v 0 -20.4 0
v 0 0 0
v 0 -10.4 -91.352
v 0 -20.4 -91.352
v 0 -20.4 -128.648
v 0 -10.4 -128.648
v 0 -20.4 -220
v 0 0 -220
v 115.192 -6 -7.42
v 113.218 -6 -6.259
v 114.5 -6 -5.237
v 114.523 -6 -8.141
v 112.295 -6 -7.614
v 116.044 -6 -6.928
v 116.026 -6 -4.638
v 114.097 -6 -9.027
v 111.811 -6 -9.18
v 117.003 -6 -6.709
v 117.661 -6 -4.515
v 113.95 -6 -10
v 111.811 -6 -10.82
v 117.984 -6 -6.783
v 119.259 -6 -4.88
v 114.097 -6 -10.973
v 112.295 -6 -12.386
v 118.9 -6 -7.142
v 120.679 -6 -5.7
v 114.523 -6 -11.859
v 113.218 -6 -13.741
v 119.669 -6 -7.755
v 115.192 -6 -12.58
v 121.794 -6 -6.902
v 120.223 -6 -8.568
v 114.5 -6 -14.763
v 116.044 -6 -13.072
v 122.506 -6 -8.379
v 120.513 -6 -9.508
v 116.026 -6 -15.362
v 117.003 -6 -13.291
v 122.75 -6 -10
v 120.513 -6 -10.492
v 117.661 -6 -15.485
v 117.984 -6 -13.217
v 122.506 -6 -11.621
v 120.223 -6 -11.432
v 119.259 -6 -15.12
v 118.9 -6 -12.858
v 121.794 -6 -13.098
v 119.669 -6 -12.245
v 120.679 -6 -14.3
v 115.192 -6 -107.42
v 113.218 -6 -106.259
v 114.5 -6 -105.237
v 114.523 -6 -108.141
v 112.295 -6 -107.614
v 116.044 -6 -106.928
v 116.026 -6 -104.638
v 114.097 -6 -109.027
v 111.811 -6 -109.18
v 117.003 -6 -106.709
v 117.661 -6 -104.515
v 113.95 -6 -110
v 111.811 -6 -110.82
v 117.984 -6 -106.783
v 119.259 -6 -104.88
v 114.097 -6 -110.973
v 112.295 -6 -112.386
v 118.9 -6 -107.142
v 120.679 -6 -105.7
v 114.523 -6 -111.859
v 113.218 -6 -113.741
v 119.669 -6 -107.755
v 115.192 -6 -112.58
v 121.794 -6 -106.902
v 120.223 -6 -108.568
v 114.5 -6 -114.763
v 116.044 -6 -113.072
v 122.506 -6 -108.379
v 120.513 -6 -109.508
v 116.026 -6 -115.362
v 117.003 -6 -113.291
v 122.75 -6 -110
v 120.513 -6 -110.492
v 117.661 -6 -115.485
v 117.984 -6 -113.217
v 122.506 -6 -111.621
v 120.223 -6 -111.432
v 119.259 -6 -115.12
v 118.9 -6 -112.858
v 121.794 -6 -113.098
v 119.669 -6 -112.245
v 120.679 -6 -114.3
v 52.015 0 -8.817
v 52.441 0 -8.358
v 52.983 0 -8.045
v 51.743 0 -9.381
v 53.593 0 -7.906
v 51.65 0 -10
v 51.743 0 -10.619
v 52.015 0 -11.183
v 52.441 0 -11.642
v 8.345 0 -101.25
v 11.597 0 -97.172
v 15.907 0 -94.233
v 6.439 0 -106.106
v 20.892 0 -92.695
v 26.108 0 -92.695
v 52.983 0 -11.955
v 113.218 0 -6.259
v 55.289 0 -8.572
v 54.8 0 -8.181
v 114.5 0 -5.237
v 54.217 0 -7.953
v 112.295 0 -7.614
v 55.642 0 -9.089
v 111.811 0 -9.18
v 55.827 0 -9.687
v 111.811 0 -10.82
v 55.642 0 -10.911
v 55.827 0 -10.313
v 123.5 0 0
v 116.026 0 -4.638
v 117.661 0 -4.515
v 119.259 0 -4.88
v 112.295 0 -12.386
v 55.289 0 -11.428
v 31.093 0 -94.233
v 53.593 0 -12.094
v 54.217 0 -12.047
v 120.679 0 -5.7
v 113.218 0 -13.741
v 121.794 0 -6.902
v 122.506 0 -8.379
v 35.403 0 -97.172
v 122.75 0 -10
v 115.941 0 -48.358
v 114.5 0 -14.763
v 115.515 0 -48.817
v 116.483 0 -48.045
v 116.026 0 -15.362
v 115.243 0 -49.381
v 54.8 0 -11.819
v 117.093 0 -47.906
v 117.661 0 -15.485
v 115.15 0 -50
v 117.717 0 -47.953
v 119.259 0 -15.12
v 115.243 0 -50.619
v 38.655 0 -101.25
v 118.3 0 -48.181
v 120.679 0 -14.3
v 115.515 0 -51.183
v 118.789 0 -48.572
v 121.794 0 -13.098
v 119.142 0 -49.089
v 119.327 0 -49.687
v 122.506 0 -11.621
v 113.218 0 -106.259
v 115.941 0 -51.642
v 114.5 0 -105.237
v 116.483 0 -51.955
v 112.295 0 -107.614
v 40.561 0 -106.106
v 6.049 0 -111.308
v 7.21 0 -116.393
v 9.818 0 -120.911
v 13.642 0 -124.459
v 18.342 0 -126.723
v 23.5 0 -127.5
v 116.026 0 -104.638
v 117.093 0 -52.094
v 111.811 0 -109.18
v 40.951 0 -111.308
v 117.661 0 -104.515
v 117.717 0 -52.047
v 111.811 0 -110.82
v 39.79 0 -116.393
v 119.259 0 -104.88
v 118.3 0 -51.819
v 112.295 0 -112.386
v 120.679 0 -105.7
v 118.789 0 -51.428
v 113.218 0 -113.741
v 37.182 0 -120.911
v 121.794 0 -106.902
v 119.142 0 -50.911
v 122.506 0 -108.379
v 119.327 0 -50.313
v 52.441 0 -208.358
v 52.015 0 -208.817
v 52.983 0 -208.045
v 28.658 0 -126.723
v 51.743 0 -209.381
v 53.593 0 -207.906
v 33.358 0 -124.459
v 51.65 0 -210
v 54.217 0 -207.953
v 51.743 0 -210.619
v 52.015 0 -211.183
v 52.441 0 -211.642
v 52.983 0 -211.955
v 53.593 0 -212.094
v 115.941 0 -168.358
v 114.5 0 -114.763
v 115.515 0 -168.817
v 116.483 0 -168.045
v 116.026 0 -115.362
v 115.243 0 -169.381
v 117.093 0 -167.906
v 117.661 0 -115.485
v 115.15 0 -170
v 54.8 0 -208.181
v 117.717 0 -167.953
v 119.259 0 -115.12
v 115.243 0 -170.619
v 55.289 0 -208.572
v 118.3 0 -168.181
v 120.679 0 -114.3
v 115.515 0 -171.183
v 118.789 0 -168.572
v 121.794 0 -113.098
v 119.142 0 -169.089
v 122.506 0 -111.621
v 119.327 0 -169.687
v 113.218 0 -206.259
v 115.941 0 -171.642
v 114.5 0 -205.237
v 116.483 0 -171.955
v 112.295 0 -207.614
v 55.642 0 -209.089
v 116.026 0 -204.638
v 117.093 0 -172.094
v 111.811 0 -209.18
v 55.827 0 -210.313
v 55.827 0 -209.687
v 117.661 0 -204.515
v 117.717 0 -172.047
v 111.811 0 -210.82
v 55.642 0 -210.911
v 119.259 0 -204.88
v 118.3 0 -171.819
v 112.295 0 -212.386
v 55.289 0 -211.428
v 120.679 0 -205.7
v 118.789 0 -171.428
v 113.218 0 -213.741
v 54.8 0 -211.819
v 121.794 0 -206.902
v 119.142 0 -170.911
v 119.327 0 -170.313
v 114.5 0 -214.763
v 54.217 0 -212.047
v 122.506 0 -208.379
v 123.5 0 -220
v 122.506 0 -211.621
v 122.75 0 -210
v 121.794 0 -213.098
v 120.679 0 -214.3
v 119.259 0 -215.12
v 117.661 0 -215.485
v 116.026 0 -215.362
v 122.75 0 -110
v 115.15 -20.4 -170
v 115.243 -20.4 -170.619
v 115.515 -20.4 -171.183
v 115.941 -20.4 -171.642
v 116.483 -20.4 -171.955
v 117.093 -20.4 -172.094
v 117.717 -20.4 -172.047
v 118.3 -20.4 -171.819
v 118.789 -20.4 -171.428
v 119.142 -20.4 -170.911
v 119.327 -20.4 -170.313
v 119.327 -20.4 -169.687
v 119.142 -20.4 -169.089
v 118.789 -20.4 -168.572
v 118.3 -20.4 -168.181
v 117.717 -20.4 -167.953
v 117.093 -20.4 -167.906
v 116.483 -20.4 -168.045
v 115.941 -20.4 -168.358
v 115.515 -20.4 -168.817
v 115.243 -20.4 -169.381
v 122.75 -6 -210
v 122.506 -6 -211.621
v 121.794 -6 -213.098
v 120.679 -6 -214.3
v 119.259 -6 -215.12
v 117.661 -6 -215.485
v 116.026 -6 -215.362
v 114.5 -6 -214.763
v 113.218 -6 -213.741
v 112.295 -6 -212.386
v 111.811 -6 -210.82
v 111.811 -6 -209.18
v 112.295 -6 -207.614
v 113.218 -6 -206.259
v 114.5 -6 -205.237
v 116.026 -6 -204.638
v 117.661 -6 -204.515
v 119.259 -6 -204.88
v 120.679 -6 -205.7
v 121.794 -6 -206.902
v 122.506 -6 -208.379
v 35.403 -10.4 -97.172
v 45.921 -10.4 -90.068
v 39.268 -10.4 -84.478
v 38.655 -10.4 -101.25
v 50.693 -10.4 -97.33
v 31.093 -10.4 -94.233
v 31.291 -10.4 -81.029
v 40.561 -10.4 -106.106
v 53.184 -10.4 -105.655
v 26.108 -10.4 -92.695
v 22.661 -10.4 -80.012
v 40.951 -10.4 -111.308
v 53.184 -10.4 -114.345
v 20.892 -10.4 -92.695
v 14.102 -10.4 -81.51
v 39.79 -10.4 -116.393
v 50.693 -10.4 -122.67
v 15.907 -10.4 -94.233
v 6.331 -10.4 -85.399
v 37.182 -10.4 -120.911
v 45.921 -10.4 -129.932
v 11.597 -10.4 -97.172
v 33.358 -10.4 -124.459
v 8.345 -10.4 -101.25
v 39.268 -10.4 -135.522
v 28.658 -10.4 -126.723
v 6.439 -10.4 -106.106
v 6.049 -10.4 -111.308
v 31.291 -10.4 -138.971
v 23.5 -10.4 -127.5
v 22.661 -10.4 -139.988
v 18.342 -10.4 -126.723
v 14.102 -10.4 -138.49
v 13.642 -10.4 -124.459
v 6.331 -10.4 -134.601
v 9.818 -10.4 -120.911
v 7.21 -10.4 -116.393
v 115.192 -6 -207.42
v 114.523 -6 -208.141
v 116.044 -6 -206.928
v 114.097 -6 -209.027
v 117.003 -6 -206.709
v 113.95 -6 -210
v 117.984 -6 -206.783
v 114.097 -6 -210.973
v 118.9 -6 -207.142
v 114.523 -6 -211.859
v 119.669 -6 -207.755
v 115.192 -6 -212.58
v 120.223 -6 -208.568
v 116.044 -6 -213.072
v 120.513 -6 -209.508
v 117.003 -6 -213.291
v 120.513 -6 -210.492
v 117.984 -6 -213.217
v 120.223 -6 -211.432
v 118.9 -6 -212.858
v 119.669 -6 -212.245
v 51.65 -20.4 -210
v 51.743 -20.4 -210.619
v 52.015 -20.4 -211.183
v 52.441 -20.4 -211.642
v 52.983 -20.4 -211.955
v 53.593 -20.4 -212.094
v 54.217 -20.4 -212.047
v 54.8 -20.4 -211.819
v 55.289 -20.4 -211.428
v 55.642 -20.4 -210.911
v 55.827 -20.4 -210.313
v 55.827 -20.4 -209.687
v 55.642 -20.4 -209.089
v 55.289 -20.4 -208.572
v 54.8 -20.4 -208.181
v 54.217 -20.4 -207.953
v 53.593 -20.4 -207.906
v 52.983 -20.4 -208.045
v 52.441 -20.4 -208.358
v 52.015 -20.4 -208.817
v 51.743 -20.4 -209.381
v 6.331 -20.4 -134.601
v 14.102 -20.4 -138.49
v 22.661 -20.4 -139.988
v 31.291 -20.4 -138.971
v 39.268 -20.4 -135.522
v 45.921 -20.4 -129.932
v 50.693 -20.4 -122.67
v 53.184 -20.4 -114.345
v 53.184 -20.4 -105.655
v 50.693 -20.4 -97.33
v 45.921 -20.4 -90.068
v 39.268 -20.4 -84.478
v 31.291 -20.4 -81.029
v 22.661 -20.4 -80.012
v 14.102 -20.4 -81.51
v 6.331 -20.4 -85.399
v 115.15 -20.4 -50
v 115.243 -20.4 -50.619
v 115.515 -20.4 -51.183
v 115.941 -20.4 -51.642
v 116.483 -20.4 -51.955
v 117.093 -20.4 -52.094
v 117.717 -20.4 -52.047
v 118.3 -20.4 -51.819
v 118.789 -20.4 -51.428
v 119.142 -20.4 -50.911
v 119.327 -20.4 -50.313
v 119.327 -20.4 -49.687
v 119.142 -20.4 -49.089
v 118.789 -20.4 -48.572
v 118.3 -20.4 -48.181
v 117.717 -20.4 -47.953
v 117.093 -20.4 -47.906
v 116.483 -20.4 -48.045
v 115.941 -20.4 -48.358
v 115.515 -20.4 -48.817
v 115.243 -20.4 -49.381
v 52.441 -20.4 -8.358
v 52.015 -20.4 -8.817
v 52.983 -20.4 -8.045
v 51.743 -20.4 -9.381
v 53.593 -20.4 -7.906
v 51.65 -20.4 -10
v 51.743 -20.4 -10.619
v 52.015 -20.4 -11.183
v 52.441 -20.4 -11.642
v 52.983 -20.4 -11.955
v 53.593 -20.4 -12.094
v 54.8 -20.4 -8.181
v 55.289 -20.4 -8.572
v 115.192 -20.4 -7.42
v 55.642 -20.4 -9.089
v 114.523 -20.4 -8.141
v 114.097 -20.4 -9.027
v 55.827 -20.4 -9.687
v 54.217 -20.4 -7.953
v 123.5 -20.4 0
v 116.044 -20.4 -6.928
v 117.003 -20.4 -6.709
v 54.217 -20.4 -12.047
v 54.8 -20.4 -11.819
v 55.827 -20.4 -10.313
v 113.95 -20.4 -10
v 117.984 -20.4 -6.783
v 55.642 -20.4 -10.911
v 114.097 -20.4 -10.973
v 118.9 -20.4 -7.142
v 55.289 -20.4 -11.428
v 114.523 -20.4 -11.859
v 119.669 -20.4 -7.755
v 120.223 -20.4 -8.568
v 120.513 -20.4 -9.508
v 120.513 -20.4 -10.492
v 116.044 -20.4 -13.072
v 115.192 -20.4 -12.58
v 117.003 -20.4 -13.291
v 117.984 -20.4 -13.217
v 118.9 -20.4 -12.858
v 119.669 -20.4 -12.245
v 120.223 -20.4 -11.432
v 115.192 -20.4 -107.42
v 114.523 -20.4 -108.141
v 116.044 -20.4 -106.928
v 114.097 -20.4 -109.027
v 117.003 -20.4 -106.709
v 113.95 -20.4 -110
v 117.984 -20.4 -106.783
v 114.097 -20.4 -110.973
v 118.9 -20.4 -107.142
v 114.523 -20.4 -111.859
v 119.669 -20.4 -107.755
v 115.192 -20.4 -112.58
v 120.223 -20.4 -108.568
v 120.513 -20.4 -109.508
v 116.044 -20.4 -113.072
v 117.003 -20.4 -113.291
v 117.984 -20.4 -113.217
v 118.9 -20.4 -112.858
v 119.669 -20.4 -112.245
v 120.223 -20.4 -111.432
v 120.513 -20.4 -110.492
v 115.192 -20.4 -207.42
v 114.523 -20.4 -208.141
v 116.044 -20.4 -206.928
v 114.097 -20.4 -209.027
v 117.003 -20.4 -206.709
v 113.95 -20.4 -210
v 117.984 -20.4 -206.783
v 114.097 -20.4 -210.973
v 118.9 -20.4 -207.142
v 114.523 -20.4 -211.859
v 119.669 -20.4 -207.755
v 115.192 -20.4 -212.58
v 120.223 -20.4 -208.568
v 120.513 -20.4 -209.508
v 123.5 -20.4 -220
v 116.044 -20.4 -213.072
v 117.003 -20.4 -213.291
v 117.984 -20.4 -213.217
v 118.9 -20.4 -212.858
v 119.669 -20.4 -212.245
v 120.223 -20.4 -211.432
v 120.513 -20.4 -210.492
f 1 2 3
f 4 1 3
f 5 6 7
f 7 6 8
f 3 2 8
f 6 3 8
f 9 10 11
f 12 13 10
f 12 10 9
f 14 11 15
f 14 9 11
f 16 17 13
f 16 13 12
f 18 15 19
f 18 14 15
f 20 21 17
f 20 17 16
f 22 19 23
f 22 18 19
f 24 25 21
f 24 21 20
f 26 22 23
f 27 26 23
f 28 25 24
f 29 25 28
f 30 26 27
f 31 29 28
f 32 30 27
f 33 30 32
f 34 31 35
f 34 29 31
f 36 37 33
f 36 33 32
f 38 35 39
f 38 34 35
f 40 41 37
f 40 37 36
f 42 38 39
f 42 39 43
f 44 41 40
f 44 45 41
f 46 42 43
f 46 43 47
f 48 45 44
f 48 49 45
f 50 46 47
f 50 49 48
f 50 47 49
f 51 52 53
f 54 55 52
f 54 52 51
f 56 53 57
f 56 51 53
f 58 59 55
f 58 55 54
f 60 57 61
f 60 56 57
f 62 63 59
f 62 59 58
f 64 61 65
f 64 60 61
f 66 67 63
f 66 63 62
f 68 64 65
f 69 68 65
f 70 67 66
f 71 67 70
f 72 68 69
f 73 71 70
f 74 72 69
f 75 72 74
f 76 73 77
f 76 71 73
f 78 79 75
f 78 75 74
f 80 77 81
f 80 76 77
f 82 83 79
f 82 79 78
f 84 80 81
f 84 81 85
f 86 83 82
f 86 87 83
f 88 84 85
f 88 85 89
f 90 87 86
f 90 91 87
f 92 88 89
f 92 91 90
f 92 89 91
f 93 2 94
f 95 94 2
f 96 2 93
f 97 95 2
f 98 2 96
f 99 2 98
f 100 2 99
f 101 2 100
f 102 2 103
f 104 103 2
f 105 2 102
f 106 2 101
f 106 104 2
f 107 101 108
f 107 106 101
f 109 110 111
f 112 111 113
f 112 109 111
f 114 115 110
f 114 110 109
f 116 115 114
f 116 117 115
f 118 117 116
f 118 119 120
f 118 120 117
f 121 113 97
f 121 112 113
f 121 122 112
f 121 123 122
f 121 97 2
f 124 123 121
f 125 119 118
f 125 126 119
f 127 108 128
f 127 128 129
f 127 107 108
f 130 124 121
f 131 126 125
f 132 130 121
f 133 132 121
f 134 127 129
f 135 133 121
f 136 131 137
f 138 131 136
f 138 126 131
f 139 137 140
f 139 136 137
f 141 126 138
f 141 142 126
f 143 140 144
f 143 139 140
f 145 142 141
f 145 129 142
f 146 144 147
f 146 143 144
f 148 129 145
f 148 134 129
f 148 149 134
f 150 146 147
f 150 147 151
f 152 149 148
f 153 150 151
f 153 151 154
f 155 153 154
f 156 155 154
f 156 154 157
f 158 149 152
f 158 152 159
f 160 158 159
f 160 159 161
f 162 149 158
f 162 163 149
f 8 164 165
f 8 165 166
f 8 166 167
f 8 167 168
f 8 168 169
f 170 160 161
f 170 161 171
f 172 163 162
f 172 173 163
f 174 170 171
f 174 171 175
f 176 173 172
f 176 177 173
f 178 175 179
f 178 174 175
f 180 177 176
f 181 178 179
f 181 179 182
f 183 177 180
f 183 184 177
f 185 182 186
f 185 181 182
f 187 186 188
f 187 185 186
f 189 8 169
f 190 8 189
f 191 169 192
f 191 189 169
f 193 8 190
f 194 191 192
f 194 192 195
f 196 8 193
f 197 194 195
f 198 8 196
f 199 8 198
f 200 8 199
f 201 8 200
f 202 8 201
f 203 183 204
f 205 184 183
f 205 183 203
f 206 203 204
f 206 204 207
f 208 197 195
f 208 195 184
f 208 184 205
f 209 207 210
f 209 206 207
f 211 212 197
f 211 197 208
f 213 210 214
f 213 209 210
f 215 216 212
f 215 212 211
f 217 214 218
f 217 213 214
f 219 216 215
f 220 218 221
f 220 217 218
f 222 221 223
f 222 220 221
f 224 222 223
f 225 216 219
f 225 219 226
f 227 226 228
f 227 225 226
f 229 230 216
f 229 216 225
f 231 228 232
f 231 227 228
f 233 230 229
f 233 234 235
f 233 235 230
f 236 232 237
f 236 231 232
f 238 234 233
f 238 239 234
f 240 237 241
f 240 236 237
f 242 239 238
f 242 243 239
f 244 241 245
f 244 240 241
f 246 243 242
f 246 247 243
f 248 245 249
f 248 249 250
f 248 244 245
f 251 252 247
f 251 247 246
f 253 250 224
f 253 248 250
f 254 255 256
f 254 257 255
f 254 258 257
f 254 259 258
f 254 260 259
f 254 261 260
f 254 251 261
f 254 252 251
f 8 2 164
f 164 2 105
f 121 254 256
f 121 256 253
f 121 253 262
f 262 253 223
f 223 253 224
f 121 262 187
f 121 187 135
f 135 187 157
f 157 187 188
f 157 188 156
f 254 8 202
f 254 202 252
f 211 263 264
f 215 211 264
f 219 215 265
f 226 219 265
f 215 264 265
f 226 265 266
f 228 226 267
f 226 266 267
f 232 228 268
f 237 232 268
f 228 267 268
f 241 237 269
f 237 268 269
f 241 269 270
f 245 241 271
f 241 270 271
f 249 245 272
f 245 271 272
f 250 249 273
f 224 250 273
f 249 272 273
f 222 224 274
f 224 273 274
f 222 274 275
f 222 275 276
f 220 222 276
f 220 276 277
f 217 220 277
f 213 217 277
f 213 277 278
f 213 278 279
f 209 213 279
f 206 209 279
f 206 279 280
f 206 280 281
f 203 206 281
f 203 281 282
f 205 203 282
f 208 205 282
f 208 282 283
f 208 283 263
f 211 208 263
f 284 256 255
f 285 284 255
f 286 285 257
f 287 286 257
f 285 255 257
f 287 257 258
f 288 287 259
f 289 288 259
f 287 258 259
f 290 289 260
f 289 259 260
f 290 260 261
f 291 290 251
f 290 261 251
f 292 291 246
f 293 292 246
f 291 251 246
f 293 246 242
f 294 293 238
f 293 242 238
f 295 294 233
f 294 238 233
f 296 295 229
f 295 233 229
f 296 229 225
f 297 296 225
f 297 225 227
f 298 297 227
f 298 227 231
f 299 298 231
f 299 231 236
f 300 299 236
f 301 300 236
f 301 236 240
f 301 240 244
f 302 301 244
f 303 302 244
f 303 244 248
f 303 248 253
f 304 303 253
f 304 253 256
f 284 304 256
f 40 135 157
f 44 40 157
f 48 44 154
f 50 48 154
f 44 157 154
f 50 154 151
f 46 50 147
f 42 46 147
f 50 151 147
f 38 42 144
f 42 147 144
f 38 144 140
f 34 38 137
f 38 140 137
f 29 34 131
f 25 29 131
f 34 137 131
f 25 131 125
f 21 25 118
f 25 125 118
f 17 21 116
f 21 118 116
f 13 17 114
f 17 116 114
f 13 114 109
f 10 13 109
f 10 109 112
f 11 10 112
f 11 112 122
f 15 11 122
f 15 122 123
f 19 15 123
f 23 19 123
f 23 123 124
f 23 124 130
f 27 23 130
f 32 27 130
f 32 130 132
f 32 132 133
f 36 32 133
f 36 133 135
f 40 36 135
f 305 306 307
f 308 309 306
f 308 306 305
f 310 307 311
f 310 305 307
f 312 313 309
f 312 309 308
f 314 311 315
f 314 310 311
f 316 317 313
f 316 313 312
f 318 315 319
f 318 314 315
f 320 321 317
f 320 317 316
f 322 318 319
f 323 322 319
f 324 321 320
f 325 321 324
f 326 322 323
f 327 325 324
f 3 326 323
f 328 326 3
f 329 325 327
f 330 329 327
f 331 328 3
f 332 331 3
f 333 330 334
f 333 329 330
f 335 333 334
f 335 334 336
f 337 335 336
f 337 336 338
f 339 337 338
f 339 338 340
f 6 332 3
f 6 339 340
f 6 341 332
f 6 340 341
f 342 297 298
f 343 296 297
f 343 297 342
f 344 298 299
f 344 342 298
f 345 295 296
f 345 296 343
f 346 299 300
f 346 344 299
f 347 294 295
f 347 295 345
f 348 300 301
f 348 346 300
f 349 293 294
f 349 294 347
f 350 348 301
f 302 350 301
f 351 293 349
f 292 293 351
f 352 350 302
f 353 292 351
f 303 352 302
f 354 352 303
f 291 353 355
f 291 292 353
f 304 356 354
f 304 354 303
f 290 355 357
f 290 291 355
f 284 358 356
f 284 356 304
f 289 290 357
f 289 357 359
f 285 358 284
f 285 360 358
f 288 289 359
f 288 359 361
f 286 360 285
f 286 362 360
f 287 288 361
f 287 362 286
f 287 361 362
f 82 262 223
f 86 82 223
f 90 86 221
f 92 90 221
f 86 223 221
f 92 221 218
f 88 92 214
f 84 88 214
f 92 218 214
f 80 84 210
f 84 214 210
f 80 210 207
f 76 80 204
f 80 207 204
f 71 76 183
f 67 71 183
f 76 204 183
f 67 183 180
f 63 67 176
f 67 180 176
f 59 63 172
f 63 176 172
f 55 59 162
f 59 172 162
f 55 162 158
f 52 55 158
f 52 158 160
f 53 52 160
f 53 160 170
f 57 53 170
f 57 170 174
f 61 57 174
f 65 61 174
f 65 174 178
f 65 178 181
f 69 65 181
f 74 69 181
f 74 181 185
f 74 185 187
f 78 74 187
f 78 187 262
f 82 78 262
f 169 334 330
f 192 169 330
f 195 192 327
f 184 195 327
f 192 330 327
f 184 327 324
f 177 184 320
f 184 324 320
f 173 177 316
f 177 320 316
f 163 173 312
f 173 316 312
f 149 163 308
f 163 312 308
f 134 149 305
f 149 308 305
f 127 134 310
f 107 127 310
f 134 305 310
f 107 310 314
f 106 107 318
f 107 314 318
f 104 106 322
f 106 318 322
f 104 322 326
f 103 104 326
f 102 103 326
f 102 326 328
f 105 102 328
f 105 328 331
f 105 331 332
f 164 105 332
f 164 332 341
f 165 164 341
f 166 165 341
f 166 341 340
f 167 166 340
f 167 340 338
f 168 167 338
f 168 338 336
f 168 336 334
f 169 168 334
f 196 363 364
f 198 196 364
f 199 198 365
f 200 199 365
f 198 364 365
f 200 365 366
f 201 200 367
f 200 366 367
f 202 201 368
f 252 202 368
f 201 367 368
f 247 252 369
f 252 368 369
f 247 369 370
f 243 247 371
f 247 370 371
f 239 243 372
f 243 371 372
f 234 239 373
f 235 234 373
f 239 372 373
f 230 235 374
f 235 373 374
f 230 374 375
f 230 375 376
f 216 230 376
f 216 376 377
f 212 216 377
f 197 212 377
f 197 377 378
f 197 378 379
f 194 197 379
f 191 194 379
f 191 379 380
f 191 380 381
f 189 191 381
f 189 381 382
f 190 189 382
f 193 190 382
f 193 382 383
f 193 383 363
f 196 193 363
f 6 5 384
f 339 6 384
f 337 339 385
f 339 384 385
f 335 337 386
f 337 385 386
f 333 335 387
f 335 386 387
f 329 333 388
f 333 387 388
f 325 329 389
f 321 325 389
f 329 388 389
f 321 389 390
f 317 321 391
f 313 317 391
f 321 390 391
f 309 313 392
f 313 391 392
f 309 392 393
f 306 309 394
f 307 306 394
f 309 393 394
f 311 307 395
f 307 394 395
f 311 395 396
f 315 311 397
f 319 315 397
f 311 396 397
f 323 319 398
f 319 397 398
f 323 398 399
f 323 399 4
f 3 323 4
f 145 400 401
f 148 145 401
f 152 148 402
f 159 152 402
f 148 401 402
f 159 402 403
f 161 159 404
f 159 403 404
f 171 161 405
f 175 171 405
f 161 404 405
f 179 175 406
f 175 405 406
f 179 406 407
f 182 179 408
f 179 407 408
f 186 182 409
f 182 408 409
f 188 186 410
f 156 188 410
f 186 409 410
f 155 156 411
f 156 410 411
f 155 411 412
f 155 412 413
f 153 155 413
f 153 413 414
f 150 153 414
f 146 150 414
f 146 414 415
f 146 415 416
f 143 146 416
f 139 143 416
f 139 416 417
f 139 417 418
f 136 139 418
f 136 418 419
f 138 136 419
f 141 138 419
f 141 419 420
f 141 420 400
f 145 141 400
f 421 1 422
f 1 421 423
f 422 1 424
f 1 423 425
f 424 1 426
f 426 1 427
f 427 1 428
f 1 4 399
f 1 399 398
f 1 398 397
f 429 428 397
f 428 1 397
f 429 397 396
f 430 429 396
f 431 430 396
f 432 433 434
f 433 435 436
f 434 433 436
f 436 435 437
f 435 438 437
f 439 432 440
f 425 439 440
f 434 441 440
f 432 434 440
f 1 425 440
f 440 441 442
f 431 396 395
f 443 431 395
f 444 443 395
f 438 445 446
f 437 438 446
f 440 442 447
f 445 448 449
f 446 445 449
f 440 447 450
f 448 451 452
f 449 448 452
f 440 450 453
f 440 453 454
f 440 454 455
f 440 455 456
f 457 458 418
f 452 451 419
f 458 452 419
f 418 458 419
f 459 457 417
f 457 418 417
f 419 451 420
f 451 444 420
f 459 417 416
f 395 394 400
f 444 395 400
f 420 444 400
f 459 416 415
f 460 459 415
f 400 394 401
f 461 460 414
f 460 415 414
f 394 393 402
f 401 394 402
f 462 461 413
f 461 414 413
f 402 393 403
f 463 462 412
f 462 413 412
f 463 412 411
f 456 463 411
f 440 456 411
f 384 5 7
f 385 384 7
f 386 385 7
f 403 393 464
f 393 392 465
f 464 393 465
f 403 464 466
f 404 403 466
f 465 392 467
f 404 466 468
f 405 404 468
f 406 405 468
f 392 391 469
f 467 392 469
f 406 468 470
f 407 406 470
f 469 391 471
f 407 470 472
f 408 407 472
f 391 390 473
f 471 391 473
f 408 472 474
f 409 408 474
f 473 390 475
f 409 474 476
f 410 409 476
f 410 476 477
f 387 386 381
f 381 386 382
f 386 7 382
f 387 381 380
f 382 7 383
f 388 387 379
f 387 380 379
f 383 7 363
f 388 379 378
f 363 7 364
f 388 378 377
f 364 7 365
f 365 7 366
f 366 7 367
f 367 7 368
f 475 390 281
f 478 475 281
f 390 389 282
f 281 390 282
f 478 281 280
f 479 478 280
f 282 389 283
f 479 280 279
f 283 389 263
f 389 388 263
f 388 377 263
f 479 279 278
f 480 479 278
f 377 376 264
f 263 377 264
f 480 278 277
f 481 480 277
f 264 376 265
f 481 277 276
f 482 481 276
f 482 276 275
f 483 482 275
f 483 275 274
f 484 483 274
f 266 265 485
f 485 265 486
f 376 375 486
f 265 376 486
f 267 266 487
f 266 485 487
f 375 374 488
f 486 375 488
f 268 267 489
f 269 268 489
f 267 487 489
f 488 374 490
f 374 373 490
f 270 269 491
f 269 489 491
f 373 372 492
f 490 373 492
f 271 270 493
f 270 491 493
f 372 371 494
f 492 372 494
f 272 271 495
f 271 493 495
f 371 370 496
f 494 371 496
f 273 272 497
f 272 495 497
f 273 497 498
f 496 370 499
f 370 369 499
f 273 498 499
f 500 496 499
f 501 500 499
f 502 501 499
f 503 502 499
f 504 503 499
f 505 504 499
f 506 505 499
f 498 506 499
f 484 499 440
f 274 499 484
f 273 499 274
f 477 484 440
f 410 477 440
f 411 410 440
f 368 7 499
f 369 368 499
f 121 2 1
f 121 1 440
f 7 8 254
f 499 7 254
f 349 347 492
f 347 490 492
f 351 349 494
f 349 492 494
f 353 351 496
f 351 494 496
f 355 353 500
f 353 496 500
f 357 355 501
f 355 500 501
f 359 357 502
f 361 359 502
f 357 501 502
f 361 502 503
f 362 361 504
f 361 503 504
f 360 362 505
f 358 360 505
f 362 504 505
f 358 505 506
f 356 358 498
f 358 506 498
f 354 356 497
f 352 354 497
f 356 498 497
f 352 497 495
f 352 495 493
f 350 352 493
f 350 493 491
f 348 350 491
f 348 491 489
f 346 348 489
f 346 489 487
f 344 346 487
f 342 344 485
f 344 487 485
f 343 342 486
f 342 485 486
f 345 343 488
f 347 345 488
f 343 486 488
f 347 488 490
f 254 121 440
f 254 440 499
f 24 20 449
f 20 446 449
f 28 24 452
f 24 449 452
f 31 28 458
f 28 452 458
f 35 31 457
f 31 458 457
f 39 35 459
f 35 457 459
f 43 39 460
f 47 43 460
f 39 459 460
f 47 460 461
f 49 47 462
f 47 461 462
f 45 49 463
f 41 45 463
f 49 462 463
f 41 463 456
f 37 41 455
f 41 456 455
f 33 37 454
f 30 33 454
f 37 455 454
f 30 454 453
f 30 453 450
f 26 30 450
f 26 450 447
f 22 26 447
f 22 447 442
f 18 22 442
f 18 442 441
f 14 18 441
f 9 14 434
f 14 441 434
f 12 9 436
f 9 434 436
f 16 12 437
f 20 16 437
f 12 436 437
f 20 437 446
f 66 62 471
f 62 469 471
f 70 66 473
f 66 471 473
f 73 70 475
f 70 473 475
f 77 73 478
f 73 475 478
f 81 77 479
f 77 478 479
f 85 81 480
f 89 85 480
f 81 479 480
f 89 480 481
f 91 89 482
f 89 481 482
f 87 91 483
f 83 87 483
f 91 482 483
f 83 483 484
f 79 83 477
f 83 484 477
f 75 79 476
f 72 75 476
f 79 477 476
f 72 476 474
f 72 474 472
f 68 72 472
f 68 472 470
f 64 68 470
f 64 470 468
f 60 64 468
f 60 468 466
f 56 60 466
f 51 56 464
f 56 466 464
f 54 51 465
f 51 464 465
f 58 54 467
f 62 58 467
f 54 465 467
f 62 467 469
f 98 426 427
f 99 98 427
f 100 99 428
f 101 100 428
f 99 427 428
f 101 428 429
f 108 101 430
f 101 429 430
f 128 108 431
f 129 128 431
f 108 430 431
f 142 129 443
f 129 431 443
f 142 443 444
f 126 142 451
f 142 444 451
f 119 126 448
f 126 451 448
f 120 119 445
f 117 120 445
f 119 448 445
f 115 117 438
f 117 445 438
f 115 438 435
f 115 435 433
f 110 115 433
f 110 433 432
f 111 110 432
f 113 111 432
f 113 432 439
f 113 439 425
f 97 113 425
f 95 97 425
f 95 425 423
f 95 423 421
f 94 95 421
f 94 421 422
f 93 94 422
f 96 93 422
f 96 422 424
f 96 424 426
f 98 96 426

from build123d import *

# Parameters (mm, degrees)
SKETCH1_W                       = 123.5
SKETCH1_H                       = 220
BLOCO_DEPTH                     = 20.4
SKETCH2_R                       = 17.5
FURO_35_PASSANTE_DEPTH          = 254.117383836
SKETCH2_4_R                     = 30
SKETCH2_4_R_2                   = 17.5
REBAIXO_60X10_DEPTH             = 10
REBAIXO_M6_PASSANTE_D           = 6.6
REBAIXO_M6_PASSANTE_CBORE_D     = 11
REBAIXO_M6_PASSANTE_CBORE_DEPTH = 6
FURO_M5X0_8_PASSANTE_D          = 4.2


with BuildPart() as part:
    # Sketch1 → Bloco (new body)
    with BuildSketch(Plane(origin=(0, 0, 0), x_dir=(1, 0, 0), z_dir=(0, 1, 0))):
        with Locations((61.75, 110)):
            Rectangle(SKETCH1_W, SKETCH1_H)
    extrude(amount=-BLOCO_DEPTH)

    # Sketch2 → Furo Ø35 Passante (cut, through all)
    with BuildSketch(Plane(origin=(0, -20.4, 0), x_dir=(-1, 0, 0), z_dir=(0, -1, 0))):
        with Locations((-23.5, 110)):
            Circle(SKETCH2_R)
    extrude(amount=-FURO_35_PASSANTE_DEPTH, mode=Mode.SUBTRACT)

    # Sketch2<4> → Rebaixo Ø60x10 (cut)
    with BuildSketch(Plane(origin=(0, -20.4, 0), x_dir=(-1, 0, 0), z_dir=(0, -1, 0))):
        with Locations((-23.5, 110)):
            Circle(SKETCH2_4_R)
        with Locations((-23.5, 110)):
            Circle(SKETCH2_4_R_2, mode=Mode.SUBTRACT)
    extrude(amount=-REBAIXO_60X10_DEPTH, mode=Mode.SUBTRACT)

    # Rebaixo M6 - Passante (through all)
    with Locations(Plane(origin=(0, 0, 0), x_dir=(1, 0, 0), z_dir=(0, 1, 0))):
        with Locations((117.25, 10), (117.25, 110), (117.25, 210)):
            CounterBoreHole(REBAIXO_M6_PASSANTE_D / 2, REBAIXO_M6_PASSANTE_CBORE_D / 2, REBAIXO_M6_PASSANTE_CBORE_DEPTH)

    # Furo M5x0.8 - Passante (through all)
    with Locations(Plane(origin=(0, 0, 0), x_dir=(1, 0, 0), z_dir=(0, 1, 0))):
        with Locations((53.75, 10), (117.25, 50), (117.25, 170), (53.75, 210)):
            Hole(FURO_M5X0_8_PASSANTE_D / 2)


solid = part.part
